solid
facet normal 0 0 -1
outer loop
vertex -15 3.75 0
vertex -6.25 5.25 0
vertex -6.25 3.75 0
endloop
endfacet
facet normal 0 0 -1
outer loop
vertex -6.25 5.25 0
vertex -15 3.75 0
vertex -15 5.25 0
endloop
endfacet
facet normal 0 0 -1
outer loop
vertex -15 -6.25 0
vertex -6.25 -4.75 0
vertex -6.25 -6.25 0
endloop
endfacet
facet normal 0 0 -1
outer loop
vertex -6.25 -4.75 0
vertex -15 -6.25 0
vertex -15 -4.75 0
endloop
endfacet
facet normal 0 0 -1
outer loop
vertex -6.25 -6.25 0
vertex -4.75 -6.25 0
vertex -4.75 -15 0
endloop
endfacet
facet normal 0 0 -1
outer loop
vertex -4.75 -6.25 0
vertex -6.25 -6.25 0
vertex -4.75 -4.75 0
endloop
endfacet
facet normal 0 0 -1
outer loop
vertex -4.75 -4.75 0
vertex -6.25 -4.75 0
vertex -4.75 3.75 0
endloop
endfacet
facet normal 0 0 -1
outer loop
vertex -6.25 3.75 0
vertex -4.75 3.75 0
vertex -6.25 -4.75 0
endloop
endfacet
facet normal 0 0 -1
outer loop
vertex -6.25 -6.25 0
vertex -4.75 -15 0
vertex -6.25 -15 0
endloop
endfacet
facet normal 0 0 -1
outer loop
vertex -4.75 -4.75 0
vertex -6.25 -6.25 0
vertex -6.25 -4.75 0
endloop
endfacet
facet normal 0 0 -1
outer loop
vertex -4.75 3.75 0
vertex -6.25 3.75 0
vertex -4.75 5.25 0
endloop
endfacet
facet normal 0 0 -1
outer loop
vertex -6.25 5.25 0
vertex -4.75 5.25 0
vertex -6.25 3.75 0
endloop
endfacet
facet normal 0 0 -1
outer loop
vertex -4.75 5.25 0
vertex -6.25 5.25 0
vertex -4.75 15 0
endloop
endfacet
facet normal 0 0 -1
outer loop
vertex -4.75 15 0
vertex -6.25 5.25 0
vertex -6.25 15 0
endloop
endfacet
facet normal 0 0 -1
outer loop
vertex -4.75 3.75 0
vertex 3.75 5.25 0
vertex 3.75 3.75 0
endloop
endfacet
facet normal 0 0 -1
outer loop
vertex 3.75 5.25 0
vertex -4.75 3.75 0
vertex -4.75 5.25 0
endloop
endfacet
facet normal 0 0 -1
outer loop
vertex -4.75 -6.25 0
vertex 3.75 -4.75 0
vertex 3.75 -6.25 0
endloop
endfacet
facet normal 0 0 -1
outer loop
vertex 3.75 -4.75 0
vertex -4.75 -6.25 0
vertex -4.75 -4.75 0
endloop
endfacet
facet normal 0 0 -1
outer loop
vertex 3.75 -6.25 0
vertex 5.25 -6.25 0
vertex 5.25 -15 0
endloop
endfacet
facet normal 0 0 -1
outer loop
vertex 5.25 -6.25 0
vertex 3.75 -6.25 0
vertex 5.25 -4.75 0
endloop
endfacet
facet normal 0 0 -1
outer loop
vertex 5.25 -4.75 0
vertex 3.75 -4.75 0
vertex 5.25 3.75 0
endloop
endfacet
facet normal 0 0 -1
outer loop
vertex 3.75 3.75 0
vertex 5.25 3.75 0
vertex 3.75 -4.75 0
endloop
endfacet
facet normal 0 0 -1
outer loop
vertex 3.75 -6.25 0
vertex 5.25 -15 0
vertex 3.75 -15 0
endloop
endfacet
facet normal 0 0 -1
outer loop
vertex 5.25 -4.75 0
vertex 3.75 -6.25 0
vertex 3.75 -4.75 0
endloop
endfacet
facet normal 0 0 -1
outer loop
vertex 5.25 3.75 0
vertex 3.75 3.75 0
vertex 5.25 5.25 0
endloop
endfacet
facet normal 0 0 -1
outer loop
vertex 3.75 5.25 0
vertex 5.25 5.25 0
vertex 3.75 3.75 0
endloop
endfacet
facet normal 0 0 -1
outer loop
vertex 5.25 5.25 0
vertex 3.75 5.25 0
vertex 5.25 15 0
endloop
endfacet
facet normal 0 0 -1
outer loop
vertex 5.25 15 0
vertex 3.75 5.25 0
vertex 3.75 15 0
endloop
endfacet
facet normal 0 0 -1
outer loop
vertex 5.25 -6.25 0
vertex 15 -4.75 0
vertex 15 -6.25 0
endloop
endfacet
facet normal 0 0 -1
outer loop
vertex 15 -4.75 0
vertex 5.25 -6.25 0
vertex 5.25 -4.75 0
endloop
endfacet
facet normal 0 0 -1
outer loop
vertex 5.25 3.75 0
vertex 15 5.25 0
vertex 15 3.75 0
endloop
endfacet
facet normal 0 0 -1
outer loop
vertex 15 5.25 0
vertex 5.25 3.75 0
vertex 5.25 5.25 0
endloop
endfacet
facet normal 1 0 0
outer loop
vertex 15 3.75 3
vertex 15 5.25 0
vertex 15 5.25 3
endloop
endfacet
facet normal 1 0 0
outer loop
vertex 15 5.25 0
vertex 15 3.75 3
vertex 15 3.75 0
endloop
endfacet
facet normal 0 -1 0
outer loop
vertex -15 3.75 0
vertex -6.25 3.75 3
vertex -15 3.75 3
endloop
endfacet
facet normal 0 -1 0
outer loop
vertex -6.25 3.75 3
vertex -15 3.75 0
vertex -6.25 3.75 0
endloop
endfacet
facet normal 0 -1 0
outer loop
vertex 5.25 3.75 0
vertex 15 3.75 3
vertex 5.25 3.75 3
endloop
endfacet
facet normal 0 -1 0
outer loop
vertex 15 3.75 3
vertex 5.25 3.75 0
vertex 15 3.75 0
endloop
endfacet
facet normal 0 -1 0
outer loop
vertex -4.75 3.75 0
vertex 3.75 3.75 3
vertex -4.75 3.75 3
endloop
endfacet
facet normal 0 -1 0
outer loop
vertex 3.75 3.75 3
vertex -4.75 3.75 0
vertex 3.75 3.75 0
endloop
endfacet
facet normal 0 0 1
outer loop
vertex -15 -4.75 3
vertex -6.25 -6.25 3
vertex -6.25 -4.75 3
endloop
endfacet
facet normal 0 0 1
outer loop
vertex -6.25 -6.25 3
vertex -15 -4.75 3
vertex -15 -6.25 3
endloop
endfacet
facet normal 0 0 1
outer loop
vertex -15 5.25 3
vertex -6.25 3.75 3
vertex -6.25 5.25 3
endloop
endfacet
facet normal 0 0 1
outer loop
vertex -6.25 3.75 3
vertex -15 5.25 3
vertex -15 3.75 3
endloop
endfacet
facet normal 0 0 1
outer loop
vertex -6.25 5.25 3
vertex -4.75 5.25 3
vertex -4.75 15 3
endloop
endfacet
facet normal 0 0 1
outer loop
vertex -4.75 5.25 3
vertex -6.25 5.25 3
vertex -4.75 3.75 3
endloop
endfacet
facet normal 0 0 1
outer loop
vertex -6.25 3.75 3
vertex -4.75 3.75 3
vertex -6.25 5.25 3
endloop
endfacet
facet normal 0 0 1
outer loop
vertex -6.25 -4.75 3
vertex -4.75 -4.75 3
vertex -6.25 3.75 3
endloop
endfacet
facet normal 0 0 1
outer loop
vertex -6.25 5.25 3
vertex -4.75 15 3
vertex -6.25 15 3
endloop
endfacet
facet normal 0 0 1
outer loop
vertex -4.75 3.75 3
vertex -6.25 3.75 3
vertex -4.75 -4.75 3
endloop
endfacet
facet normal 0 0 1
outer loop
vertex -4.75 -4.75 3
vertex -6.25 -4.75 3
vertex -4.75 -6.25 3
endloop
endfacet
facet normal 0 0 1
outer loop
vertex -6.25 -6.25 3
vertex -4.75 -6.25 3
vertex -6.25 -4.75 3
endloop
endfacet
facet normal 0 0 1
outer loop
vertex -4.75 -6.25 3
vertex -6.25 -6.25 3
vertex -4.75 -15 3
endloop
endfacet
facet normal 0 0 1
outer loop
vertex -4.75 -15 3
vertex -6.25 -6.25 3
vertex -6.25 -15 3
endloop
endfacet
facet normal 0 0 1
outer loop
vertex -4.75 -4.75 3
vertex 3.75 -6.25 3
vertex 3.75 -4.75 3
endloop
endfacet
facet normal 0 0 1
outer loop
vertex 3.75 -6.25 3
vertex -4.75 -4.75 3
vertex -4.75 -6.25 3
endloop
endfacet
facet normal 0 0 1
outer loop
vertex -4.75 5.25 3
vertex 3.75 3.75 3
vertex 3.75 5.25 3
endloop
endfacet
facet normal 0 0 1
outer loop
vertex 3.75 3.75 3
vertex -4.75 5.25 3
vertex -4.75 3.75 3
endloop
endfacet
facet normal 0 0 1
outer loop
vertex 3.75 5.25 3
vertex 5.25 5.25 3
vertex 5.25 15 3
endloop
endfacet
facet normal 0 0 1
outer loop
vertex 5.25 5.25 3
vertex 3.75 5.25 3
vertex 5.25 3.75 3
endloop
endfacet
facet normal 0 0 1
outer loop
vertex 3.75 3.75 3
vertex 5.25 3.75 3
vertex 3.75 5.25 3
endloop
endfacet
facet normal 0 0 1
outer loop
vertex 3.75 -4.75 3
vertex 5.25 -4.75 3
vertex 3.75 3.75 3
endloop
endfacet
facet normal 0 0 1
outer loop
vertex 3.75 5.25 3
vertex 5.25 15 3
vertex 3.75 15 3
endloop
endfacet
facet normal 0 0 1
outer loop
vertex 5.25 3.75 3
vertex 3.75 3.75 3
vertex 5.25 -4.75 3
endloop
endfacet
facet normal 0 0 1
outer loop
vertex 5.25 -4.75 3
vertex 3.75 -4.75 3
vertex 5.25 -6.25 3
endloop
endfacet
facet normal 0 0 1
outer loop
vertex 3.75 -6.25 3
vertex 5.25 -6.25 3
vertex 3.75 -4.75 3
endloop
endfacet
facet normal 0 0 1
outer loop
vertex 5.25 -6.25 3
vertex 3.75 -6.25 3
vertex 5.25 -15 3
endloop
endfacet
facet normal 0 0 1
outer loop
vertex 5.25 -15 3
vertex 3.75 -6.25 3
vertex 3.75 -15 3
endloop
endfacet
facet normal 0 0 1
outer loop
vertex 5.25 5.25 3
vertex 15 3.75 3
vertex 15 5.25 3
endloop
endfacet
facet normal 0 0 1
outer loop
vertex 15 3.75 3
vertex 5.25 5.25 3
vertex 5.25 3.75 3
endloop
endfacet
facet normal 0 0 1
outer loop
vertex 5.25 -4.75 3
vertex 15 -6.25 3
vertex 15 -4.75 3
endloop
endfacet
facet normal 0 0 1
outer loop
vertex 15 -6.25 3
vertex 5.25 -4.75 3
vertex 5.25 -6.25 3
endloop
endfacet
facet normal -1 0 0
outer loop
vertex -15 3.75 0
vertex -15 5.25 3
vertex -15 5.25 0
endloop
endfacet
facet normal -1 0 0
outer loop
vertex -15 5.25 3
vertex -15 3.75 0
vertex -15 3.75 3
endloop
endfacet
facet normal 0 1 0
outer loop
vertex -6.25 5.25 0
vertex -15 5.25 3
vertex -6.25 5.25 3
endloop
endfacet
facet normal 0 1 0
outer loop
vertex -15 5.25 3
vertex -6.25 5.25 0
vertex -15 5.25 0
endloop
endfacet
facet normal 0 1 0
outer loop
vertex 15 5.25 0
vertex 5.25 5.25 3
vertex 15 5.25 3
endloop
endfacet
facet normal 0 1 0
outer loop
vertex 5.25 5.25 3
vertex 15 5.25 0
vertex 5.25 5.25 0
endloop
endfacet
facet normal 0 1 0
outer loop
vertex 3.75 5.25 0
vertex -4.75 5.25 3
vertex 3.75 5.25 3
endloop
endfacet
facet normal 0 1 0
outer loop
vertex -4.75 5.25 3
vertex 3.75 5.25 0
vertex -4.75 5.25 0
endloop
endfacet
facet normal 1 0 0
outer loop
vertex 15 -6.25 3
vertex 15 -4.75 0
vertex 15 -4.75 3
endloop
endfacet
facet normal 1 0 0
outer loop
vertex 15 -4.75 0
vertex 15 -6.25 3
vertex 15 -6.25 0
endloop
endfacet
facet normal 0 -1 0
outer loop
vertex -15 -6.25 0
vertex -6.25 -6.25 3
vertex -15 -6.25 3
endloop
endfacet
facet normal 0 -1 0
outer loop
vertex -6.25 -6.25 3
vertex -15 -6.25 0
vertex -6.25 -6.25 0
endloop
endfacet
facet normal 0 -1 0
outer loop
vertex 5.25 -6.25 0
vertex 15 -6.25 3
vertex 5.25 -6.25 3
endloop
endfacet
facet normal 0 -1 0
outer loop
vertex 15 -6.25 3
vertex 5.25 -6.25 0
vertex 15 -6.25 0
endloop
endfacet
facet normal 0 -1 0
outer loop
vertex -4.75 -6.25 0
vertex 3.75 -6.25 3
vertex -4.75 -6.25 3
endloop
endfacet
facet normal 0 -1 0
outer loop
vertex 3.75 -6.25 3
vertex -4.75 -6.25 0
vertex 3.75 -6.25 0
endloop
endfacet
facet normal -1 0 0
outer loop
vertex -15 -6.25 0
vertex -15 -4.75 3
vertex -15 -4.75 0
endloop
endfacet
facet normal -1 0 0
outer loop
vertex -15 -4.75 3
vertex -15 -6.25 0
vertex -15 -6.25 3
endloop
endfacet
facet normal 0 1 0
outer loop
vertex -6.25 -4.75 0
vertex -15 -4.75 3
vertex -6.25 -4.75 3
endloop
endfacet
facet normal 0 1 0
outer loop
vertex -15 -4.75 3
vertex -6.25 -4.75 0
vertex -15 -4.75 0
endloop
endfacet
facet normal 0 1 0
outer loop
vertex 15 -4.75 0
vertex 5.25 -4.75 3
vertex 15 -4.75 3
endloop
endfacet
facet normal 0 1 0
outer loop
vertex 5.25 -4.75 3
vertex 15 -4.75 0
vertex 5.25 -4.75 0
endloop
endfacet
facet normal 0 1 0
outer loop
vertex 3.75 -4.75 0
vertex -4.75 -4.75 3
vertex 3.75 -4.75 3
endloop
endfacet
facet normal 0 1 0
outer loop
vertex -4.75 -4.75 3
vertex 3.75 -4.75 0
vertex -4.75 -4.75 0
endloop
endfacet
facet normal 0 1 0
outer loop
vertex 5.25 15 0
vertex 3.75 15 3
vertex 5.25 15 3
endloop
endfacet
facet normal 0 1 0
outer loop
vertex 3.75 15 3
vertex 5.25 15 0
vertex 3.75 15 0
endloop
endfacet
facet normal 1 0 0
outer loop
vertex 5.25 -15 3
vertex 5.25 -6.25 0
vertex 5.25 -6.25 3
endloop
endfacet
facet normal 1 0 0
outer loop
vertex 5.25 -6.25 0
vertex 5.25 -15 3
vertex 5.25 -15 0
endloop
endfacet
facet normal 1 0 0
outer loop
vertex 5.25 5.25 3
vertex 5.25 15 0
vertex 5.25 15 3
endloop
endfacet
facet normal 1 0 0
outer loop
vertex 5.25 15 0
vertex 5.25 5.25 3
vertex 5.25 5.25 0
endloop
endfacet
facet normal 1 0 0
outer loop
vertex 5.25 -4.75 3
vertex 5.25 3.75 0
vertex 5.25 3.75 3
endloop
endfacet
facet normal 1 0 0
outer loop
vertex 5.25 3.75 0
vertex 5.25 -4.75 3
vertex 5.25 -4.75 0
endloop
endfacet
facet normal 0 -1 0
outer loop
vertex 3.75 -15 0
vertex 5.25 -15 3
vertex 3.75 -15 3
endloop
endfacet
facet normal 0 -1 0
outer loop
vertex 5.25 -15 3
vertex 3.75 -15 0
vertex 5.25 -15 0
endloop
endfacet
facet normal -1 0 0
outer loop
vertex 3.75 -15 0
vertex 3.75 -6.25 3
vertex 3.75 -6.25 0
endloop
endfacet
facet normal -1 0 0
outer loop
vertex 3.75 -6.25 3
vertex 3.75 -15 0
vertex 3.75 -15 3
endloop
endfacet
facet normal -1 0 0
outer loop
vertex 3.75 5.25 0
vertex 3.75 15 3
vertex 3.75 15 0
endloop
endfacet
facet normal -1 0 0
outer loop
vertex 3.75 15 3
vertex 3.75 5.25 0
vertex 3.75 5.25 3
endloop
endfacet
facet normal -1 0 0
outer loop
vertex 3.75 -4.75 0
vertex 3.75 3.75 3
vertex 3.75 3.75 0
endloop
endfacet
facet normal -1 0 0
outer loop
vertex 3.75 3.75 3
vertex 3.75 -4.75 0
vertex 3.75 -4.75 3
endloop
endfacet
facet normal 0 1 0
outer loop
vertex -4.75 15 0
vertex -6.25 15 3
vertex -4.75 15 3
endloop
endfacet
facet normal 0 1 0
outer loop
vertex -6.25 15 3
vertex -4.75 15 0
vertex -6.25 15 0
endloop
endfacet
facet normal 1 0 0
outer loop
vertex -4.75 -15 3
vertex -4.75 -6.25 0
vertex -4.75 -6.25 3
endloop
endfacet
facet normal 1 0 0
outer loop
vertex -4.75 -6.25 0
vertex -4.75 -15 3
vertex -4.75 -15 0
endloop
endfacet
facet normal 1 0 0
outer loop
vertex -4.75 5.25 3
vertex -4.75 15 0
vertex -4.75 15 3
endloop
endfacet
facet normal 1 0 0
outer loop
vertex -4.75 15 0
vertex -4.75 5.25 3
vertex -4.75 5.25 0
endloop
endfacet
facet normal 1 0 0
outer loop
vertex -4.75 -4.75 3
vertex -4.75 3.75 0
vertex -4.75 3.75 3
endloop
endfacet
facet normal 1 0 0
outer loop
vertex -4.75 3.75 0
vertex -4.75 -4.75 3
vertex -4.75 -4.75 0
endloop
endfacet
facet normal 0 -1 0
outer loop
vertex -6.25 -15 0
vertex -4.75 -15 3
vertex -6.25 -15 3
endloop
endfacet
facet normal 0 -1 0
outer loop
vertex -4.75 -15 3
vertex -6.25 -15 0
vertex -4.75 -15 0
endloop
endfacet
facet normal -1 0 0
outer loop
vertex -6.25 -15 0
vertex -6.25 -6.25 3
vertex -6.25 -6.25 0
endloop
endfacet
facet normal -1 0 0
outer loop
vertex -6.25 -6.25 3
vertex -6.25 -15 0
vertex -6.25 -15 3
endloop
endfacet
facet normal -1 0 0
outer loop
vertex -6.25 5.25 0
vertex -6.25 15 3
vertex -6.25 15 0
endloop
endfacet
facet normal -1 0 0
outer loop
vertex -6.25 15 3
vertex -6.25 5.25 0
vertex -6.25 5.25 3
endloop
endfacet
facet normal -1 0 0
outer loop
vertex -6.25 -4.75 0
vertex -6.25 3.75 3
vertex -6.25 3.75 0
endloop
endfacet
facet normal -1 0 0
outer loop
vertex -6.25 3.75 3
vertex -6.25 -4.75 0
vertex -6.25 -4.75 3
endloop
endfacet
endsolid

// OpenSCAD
union()
{
    translate([0.0, 4.5, 0.0])
    {
        linear_extrude(height = 3.0, twist = 0.0, scale = 1.0, slices = 1, center = false)
        {
            scale([30.0, 1.5])
            {
                M8();
            }
        }
    }
    translate([0.0, -5.5, 0.0])
    {
        linear_extrude(height = 3.0, twist = 0.0, scale = 1.0, slices = 1, center = false)
        {
            scale([30.0, 1.5])
            {
                M8();
            }
        }
    }
    translate([4.5, 0.0, 0.0])
    {
        rotate([0.0, 0.0, 90.0])
        {
            linear_extrude(height = 3.0, twist = 0.0, scale = 1.0, slices = 1, center = false)
            {
                scale([30.0, 1.5])
                {
                    M8();
                }
            }
        }
    }
    translate([-5.5, 0.0, 0.0])
    {
        rotate([0.0, 0.0, 90.0])
        {
            linear_extrude(height = 3.0, twist = 0.0, scale = 1.0, slices = 1, center = false)
            {
                scale([30.0, 1.5])
                {
                    M8();
                }
            }
        }
    }
}

module M8()
{
    polygon
    (
        points =
        [
            [-0.5, -0.5], 
            [0.5, -0.5], 
            [0.5, 0.5], 
            [-0.5, 0.5]
        ],
        paths =
        [
            [0, 1, 2, 3]
        ]
    );
}
